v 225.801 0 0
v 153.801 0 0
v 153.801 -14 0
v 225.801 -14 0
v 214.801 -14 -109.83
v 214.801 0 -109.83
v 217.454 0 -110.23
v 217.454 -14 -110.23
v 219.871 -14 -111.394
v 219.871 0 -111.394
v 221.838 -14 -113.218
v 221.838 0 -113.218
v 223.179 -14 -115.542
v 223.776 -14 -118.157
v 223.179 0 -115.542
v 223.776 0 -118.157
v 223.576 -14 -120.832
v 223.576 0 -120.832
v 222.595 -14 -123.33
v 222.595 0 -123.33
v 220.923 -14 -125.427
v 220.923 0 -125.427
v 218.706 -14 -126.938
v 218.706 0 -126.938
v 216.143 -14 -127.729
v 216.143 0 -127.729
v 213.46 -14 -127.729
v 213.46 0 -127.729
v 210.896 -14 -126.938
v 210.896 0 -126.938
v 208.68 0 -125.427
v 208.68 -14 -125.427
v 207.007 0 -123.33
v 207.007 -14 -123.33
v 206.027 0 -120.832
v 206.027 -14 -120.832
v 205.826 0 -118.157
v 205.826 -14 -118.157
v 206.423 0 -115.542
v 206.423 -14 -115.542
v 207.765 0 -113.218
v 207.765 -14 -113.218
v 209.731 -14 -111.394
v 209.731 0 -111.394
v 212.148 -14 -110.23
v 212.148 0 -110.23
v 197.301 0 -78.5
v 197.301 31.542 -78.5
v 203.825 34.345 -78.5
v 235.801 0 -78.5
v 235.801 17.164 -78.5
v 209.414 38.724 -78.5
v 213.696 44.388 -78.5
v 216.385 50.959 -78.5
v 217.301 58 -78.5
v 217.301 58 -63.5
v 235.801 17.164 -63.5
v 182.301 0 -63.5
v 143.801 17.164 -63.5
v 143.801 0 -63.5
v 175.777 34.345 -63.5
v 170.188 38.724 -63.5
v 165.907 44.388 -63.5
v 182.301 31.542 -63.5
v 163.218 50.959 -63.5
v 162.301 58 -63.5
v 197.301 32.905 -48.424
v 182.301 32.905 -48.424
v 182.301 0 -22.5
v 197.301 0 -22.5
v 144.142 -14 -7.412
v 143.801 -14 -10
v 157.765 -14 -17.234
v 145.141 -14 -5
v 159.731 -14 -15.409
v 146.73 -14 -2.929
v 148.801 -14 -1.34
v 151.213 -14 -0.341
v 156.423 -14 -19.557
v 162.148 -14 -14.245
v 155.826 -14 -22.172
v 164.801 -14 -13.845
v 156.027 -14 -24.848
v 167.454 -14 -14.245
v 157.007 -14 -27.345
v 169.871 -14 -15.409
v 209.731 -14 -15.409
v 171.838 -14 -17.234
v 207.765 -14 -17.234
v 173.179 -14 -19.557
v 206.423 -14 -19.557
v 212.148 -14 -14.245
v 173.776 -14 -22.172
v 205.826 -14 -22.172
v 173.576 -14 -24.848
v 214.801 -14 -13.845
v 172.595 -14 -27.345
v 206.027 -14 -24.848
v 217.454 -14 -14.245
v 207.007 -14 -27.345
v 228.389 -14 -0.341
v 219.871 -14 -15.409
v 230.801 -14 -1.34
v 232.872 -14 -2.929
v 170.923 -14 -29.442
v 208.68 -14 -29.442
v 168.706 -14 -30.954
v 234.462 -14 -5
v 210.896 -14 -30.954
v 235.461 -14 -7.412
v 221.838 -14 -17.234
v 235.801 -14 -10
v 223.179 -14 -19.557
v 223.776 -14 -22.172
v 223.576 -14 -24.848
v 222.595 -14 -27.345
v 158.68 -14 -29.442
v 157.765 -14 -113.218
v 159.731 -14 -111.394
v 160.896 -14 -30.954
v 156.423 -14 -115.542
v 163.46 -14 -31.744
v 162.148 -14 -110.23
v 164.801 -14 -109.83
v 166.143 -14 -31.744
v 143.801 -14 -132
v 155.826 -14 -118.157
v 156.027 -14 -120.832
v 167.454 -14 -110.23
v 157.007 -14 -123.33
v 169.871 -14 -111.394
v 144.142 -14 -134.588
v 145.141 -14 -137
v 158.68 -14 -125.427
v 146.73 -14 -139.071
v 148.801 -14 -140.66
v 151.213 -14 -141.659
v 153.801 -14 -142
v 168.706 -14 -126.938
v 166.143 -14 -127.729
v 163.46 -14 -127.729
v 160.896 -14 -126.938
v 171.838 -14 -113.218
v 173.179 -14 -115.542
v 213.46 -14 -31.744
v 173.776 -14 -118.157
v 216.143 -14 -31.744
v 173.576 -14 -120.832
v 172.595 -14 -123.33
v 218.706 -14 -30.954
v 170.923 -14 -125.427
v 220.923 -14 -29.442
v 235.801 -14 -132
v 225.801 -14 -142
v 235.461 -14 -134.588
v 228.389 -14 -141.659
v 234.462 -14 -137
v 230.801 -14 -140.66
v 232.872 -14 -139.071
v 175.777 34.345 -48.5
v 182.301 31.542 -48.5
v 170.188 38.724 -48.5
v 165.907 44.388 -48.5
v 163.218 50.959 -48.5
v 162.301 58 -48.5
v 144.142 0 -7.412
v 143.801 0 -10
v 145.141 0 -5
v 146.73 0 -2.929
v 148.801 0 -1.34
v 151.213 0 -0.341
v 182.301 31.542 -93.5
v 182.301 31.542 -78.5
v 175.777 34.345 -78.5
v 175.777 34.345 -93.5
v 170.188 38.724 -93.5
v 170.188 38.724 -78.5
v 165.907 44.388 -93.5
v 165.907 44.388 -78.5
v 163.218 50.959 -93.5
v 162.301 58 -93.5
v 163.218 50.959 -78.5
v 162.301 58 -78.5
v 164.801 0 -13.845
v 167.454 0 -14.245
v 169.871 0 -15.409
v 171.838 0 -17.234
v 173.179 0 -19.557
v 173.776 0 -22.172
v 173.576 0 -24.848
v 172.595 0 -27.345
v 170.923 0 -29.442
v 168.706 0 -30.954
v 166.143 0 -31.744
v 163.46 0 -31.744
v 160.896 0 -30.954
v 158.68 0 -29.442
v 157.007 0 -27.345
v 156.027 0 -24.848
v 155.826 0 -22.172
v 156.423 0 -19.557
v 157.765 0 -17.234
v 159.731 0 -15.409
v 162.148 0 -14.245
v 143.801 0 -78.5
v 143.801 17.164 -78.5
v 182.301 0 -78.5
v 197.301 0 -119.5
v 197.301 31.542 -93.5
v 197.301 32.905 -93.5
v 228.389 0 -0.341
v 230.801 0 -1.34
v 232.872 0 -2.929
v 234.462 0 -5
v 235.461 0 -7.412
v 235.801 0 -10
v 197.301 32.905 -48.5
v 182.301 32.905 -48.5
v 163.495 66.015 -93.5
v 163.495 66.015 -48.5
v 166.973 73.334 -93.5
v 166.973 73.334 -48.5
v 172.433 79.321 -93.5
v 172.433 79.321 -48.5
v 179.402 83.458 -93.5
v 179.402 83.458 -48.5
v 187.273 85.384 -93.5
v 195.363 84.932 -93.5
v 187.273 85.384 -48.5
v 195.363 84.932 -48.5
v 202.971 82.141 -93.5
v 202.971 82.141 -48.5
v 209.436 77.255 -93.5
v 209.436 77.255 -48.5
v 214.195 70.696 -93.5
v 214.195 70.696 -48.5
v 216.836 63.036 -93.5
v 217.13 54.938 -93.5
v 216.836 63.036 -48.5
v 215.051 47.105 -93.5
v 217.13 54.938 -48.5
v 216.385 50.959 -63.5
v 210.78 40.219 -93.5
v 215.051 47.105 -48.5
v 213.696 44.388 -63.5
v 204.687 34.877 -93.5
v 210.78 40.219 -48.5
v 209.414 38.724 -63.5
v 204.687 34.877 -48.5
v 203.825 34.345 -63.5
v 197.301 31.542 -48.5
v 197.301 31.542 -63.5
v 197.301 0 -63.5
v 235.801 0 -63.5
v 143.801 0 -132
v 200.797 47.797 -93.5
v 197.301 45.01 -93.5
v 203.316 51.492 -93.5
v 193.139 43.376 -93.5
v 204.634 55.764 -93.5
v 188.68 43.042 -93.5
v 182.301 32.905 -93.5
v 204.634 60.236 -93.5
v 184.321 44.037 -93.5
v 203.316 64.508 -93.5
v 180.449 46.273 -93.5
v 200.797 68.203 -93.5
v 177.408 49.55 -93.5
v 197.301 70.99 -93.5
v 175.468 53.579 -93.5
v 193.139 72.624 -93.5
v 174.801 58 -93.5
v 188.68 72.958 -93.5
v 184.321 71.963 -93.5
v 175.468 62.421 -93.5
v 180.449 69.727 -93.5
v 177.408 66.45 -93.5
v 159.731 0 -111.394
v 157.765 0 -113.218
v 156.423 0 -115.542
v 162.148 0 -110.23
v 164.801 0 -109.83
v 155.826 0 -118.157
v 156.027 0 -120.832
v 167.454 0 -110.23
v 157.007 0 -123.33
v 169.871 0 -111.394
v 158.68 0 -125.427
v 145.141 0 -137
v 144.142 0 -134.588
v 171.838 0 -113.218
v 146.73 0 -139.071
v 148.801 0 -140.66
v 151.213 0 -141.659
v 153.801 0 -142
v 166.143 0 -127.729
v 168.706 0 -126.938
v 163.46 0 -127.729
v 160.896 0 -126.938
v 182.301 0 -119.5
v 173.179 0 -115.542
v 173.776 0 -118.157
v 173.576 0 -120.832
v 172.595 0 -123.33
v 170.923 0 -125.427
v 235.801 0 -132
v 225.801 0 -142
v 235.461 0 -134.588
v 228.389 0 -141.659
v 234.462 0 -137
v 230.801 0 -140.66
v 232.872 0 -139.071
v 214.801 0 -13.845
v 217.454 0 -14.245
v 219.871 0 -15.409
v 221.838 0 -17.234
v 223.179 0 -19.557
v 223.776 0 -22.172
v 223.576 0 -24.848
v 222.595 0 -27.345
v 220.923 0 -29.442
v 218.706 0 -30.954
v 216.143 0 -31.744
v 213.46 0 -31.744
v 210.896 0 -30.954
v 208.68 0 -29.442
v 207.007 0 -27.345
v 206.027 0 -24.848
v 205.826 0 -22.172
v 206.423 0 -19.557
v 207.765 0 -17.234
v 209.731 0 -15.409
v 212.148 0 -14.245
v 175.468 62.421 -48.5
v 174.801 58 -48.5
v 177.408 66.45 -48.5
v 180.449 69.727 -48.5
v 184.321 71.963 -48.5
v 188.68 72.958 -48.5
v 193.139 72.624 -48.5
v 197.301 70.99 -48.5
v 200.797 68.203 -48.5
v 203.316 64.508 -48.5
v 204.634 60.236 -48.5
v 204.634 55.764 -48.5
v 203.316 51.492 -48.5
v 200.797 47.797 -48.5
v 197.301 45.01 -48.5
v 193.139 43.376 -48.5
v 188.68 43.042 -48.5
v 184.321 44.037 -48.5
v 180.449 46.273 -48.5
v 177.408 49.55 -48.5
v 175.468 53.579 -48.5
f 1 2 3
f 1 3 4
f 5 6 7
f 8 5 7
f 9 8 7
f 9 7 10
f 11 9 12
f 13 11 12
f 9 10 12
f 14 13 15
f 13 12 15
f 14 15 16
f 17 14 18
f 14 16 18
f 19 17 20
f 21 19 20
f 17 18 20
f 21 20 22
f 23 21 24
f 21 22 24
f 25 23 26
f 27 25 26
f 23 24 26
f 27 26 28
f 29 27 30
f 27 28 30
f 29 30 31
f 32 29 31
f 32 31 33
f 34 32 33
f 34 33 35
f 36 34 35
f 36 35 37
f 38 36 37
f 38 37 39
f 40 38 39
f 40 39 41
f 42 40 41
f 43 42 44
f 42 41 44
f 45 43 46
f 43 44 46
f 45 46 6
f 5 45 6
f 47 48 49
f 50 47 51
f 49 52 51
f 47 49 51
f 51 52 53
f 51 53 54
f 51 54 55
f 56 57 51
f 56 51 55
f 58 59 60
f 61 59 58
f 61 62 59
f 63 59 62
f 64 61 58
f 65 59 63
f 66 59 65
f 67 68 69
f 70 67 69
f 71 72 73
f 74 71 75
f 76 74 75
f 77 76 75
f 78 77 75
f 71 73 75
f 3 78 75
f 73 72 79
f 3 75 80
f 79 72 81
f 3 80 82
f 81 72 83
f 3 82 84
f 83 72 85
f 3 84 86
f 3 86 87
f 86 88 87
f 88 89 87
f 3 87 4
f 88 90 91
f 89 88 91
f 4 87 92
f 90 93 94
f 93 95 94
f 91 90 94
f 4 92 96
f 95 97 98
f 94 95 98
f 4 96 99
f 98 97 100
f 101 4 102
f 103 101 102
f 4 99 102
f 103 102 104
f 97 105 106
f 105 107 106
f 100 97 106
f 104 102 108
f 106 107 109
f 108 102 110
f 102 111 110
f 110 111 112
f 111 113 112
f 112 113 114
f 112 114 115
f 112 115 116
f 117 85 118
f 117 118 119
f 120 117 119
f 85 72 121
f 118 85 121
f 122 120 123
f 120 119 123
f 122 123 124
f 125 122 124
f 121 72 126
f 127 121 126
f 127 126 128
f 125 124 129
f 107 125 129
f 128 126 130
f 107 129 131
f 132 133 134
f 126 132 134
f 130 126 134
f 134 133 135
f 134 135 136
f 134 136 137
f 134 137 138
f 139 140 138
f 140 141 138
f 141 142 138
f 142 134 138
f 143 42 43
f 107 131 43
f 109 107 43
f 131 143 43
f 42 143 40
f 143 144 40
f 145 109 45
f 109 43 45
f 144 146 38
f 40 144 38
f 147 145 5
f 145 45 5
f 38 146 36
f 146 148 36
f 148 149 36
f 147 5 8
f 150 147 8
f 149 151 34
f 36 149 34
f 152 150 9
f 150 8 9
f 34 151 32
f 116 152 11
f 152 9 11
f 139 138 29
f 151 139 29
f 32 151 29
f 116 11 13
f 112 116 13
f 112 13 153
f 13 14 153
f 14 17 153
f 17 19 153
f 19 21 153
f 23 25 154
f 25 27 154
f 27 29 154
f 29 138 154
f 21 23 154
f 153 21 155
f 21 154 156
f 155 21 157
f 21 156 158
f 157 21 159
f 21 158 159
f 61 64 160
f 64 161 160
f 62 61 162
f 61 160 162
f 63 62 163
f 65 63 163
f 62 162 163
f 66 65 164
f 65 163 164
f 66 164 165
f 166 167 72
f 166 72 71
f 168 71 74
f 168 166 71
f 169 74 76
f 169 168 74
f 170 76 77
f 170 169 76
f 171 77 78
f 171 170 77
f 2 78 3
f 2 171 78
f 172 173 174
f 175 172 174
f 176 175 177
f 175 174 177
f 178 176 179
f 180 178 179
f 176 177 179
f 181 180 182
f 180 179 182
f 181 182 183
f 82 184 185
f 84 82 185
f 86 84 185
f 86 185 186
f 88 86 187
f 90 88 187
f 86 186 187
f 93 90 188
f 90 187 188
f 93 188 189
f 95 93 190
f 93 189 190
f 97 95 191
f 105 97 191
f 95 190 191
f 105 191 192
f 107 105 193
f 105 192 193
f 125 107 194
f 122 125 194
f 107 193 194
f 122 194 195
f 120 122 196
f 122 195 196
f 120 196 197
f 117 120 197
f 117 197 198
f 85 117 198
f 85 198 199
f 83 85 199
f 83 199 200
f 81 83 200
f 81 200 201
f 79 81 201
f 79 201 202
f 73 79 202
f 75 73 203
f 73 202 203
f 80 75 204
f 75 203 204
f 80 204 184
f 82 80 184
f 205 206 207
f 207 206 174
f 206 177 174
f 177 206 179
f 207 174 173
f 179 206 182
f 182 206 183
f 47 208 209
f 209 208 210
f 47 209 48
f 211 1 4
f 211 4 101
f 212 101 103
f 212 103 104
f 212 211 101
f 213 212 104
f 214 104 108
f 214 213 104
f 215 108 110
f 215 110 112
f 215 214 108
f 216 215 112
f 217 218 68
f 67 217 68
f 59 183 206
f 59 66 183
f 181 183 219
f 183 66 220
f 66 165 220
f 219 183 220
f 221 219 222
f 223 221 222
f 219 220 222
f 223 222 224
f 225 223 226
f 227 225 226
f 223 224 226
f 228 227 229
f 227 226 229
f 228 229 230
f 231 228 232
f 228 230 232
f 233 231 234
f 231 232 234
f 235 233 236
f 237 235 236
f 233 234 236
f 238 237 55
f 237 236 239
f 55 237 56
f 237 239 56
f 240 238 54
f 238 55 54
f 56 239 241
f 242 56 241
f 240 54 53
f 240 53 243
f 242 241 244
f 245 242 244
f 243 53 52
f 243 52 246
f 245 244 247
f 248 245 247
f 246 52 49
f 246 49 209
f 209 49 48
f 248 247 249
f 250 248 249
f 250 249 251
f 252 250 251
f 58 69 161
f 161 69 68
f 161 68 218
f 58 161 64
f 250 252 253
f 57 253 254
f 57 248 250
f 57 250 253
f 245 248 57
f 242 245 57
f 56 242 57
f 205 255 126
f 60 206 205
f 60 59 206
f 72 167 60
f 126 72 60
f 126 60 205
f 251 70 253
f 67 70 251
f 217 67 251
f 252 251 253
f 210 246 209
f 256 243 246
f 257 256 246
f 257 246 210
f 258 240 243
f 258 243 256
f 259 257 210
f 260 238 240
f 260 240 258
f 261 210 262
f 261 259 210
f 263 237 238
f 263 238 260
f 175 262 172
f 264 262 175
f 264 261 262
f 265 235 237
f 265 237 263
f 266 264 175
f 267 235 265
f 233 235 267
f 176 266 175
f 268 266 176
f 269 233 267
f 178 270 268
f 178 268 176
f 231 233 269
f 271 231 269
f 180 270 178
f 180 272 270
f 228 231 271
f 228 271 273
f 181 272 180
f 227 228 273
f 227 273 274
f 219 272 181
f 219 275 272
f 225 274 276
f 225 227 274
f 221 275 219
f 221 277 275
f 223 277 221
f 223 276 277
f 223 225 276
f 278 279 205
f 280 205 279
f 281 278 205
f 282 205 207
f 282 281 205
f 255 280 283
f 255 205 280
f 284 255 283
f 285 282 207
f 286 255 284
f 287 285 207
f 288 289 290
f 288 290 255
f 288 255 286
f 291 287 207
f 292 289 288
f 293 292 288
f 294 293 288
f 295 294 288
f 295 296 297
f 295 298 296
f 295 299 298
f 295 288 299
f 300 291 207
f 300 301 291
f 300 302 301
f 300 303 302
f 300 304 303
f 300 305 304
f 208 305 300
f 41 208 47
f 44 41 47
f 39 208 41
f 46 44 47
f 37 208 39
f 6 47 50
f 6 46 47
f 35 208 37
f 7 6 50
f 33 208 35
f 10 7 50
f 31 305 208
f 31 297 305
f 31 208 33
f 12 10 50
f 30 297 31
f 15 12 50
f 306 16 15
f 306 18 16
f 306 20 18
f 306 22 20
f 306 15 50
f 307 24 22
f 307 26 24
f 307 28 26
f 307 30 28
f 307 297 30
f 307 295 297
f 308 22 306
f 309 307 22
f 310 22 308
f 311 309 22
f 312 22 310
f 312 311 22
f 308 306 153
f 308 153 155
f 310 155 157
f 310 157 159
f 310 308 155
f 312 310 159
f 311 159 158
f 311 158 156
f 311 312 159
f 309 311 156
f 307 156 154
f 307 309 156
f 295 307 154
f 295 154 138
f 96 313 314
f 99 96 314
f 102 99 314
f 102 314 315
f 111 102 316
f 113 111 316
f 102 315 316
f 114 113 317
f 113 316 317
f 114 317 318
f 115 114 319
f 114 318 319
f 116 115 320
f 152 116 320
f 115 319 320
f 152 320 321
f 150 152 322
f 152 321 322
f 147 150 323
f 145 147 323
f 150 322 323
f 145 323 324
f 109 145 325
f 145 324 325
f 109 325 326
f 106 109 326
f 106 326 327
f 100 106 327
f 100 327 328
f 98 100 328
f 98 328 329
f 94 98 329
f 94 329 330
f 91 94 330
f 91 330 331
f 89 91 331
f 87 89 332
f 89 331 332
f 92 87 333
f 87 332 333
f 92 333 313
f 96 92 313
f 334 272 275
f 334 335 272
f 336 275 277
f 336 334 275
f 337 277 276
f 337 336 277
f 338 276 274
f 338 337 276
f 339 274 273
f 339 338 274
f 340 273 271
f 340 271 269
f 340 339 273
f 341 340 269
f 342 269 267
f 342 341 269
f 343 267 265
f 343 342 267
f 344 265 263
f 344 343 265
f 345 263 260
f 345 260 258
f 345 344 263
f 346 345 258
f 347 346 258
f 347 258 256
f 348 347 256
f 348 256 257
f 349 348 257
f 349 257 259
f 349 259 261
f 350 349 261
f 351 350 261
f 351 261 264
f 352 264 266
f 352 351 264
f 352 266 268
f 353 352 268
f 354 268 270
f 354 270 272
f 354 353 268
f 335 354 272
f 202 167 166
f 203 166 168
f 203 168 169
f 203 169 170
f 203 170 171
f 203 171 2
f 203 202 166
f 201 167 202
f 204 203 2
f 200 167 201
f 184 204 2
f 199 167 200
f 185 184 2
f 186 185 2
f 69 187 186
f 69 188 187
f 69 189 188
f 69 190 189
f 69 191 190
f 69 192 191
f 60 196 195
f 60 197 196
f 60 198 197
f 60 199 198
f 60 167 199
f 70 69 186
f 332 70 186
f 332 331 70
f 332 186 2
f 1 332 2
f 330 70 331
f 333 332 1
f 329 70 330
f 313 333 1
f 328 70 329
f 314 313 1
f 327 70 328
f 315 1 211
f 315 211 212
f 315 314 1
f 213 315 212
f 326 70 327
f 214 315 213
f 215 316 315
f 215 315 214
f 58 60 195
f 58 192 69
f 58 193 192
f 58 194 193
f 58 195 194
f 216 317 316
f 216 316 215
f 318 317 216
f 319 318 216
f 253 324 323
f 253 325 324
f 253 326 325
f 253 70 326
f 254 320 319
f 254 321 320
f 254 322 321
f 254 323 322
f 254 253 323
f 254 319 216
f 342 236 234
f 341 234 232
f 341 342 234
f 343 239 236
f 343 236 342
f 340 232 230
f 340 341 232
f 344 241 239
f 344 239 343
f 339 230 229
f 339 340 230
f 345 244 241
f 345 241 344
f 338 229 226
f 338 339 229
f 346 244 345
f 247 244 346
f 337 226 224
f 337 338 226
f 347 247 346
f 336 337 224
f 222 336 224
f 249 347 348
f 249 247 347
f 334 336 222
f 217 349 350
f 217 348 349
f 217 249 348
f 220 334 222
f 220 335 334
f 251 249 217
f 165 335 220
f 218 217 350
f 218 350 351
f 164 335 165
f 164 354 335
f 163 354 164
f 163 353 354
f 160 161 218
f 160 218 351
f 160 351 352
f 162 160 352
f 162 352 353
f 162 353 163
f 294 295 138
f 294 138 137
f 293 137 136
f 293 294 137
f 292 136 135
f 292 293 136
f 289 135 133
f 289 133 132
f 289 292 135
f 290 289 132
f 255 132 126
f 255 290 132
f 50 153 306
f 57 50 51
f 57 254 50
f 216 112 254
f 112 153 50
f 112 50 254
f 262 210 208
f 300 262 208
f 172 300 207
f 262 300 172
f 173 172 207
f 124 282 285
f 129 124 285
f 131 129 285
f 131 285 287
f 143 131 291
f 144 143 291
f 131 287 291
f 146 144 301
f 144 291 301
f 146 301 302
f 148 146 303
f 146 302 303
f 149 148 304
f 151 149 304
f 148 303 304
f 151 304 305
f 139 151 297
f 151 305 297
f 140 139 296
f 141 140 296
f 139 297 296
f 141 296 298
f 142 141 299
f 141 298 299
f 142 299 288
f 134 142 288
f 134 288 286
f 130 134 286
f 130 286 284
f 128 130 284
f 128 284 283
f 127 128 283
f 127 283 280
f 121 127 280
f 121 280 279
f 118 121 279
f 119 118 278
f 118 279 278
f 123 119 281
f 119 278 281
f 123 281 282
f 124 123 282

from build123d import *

# Parameters (mm, degrees)
SKETCH1_R           = 9
BOSS_EXTRUDE1_DEPTH = 14
SKETCH2_R           = 27.5
SKETCH2_R_2         = 15
BOSS_EXTRUDE2_DEPTH = 22.5
SKETCH3_R           = 27.5
SKETCH3_R_2         = 15
BOSS_EXTRUDE3_DEPTH = 22.5
BOSS_EXTRUDE4_DEPTH = 7.5
BOSS_EXTRUDE9_DEPTH = 7.5


with BuildPart() as part:
    # Sketch1 → Boss-Extrude1 (new body)
    with BuildSketch(Plane(origin=(0, 0, 0), x_dir=(1, 0, 0), z_dir=(0, 1, 0))):
        with BuildLine():
            Line((153.801246265, 0), (225.801246265, 0))
            ThreePointArc((225.801246265, 0), (232.872314076, 2.928932188), (235.801246265, 10))
            Line((235.801246265, 10), (235.801246265, 132))
            ThreePointArc((235.801246265, 132), (232.872314076, 139.071067812), (225.801246265, 142))
            Line((225.801246265, 142), (153.801246265, 142))
            ThreePointArc((153.801246265, 142), (146.730178453, 139.071067812), (143.801246265, 132))
            Line((143.801246265, 132), (143.801246265, 10))
            ThreePointArc((143.801246265, 10), (146.730178453, 2.928932188), (153.801246265, 0))
        make_face()
        with Locations(Location((164.801246265, 22.845020392, 0), (0, 0, 270))):
            Circle(SKETCH1_R, mode=Mode.SUBTRACT)
        with Locations(Location((214.801246265, 22.845020392, 0), (0, 0, 270))):
            Circle(SKETCH1_R, mode=Mode.SUBTRACT)
        with Locations(Location((214.801246265, 118.829727622, 0), (0, 0, 270))):
            Circle(SKETCH1_R, mode=Mode.SUBTRACT)
        with Locations(Location((164.801246265, 118.829727622, 0), (0, 0, 270))):
            Circle(SKETCH1_R, mode=Mode.SUBTRACT)
    extrude(amount=-BOSS_EXTRUDE1_DEPTH)



with BuildPart() as body_2:
    # Sketch2 → Boss-Extrude2 (new body)
    with BuildSketch(Plane.XY.offset(-71)):
        with Locations(Location((189.801246265, 58, 0), (0, 0, 180))):
            Circle(SKETCH2_R)
        with Locations(Location((189.801246265, 58, 0), (0, 0, 180))):
            Circle(SKETCH2_R_2, mode=Mode.SUBTRACT)
    extrude(amount=BOSS_EXTRUDE2_DEPTH)

    # Sketch3 → Boss-Extrude3 (add)
    with BuildSketch(Plane(origin=(0, 0, -71), x_dir=(-1, 0, 0), z_dir=(0, 0, -1))):
        with Locations((-189.801246265, 58)):
            Circle(SKETCH3_R)
        with Locations((-189.801246265, 58)):
            Circle(SKETCH3_R_2, mode=Mode.SUBTRACT)
    extrude(amount=BOSS_EXTRUDE3_DEPTH)


with BuildPart() as part_1:
    add(part.part)

    add(body_2.part)  # Boss-Extrude4 merges body 2
    # Sketch4 → Boss-Extrude4 (add, symmetric)
    with BuildSketch(Plane.XY.offset(-71)):
        with BuildLine():
            Line((143.801246265, 0), (235.801246265, 0))
            Line((235.801246265, 0), (235.801246265, 17.16449016))
            Line((235.801246265, 17.16449016), (217.301246265, 58))
            ThreePointArc((217.301246265, 58), (189.801246265, 30.5), (162.301246265, 58))
            Line((162.301246265, 58), (143.801246265, 17.16449016))
            Line((143.801246265, 17.16449016), (143.801246265, 0))
        make_face()
    extrude(amount=BOSS_EXTRUDE4_DEPTH, both=True)

    # Sketch6 → Boss-Extrude9 (add, symmetric)
    with BuildSketch(Plane.ZY.offset(-189.801246265)):
        Polygon((-119.5, 0), (-78.5, 0), (-76.506871872, 0), (-76.506871872, 30.5), (-76.506871872, 32.905088901), (-93.5, 32.905088901), align=None)
        Polygon((-22.5, 0), (-63.5, 0), (-65.39508201, 0), (-65.39508201, 32.905088901), (-48.424150578, 32.905088901), align=None)
    extrude(amount=BOSS_EXTRUDE9_DEPTH, both=True)


solid = part_1.part
